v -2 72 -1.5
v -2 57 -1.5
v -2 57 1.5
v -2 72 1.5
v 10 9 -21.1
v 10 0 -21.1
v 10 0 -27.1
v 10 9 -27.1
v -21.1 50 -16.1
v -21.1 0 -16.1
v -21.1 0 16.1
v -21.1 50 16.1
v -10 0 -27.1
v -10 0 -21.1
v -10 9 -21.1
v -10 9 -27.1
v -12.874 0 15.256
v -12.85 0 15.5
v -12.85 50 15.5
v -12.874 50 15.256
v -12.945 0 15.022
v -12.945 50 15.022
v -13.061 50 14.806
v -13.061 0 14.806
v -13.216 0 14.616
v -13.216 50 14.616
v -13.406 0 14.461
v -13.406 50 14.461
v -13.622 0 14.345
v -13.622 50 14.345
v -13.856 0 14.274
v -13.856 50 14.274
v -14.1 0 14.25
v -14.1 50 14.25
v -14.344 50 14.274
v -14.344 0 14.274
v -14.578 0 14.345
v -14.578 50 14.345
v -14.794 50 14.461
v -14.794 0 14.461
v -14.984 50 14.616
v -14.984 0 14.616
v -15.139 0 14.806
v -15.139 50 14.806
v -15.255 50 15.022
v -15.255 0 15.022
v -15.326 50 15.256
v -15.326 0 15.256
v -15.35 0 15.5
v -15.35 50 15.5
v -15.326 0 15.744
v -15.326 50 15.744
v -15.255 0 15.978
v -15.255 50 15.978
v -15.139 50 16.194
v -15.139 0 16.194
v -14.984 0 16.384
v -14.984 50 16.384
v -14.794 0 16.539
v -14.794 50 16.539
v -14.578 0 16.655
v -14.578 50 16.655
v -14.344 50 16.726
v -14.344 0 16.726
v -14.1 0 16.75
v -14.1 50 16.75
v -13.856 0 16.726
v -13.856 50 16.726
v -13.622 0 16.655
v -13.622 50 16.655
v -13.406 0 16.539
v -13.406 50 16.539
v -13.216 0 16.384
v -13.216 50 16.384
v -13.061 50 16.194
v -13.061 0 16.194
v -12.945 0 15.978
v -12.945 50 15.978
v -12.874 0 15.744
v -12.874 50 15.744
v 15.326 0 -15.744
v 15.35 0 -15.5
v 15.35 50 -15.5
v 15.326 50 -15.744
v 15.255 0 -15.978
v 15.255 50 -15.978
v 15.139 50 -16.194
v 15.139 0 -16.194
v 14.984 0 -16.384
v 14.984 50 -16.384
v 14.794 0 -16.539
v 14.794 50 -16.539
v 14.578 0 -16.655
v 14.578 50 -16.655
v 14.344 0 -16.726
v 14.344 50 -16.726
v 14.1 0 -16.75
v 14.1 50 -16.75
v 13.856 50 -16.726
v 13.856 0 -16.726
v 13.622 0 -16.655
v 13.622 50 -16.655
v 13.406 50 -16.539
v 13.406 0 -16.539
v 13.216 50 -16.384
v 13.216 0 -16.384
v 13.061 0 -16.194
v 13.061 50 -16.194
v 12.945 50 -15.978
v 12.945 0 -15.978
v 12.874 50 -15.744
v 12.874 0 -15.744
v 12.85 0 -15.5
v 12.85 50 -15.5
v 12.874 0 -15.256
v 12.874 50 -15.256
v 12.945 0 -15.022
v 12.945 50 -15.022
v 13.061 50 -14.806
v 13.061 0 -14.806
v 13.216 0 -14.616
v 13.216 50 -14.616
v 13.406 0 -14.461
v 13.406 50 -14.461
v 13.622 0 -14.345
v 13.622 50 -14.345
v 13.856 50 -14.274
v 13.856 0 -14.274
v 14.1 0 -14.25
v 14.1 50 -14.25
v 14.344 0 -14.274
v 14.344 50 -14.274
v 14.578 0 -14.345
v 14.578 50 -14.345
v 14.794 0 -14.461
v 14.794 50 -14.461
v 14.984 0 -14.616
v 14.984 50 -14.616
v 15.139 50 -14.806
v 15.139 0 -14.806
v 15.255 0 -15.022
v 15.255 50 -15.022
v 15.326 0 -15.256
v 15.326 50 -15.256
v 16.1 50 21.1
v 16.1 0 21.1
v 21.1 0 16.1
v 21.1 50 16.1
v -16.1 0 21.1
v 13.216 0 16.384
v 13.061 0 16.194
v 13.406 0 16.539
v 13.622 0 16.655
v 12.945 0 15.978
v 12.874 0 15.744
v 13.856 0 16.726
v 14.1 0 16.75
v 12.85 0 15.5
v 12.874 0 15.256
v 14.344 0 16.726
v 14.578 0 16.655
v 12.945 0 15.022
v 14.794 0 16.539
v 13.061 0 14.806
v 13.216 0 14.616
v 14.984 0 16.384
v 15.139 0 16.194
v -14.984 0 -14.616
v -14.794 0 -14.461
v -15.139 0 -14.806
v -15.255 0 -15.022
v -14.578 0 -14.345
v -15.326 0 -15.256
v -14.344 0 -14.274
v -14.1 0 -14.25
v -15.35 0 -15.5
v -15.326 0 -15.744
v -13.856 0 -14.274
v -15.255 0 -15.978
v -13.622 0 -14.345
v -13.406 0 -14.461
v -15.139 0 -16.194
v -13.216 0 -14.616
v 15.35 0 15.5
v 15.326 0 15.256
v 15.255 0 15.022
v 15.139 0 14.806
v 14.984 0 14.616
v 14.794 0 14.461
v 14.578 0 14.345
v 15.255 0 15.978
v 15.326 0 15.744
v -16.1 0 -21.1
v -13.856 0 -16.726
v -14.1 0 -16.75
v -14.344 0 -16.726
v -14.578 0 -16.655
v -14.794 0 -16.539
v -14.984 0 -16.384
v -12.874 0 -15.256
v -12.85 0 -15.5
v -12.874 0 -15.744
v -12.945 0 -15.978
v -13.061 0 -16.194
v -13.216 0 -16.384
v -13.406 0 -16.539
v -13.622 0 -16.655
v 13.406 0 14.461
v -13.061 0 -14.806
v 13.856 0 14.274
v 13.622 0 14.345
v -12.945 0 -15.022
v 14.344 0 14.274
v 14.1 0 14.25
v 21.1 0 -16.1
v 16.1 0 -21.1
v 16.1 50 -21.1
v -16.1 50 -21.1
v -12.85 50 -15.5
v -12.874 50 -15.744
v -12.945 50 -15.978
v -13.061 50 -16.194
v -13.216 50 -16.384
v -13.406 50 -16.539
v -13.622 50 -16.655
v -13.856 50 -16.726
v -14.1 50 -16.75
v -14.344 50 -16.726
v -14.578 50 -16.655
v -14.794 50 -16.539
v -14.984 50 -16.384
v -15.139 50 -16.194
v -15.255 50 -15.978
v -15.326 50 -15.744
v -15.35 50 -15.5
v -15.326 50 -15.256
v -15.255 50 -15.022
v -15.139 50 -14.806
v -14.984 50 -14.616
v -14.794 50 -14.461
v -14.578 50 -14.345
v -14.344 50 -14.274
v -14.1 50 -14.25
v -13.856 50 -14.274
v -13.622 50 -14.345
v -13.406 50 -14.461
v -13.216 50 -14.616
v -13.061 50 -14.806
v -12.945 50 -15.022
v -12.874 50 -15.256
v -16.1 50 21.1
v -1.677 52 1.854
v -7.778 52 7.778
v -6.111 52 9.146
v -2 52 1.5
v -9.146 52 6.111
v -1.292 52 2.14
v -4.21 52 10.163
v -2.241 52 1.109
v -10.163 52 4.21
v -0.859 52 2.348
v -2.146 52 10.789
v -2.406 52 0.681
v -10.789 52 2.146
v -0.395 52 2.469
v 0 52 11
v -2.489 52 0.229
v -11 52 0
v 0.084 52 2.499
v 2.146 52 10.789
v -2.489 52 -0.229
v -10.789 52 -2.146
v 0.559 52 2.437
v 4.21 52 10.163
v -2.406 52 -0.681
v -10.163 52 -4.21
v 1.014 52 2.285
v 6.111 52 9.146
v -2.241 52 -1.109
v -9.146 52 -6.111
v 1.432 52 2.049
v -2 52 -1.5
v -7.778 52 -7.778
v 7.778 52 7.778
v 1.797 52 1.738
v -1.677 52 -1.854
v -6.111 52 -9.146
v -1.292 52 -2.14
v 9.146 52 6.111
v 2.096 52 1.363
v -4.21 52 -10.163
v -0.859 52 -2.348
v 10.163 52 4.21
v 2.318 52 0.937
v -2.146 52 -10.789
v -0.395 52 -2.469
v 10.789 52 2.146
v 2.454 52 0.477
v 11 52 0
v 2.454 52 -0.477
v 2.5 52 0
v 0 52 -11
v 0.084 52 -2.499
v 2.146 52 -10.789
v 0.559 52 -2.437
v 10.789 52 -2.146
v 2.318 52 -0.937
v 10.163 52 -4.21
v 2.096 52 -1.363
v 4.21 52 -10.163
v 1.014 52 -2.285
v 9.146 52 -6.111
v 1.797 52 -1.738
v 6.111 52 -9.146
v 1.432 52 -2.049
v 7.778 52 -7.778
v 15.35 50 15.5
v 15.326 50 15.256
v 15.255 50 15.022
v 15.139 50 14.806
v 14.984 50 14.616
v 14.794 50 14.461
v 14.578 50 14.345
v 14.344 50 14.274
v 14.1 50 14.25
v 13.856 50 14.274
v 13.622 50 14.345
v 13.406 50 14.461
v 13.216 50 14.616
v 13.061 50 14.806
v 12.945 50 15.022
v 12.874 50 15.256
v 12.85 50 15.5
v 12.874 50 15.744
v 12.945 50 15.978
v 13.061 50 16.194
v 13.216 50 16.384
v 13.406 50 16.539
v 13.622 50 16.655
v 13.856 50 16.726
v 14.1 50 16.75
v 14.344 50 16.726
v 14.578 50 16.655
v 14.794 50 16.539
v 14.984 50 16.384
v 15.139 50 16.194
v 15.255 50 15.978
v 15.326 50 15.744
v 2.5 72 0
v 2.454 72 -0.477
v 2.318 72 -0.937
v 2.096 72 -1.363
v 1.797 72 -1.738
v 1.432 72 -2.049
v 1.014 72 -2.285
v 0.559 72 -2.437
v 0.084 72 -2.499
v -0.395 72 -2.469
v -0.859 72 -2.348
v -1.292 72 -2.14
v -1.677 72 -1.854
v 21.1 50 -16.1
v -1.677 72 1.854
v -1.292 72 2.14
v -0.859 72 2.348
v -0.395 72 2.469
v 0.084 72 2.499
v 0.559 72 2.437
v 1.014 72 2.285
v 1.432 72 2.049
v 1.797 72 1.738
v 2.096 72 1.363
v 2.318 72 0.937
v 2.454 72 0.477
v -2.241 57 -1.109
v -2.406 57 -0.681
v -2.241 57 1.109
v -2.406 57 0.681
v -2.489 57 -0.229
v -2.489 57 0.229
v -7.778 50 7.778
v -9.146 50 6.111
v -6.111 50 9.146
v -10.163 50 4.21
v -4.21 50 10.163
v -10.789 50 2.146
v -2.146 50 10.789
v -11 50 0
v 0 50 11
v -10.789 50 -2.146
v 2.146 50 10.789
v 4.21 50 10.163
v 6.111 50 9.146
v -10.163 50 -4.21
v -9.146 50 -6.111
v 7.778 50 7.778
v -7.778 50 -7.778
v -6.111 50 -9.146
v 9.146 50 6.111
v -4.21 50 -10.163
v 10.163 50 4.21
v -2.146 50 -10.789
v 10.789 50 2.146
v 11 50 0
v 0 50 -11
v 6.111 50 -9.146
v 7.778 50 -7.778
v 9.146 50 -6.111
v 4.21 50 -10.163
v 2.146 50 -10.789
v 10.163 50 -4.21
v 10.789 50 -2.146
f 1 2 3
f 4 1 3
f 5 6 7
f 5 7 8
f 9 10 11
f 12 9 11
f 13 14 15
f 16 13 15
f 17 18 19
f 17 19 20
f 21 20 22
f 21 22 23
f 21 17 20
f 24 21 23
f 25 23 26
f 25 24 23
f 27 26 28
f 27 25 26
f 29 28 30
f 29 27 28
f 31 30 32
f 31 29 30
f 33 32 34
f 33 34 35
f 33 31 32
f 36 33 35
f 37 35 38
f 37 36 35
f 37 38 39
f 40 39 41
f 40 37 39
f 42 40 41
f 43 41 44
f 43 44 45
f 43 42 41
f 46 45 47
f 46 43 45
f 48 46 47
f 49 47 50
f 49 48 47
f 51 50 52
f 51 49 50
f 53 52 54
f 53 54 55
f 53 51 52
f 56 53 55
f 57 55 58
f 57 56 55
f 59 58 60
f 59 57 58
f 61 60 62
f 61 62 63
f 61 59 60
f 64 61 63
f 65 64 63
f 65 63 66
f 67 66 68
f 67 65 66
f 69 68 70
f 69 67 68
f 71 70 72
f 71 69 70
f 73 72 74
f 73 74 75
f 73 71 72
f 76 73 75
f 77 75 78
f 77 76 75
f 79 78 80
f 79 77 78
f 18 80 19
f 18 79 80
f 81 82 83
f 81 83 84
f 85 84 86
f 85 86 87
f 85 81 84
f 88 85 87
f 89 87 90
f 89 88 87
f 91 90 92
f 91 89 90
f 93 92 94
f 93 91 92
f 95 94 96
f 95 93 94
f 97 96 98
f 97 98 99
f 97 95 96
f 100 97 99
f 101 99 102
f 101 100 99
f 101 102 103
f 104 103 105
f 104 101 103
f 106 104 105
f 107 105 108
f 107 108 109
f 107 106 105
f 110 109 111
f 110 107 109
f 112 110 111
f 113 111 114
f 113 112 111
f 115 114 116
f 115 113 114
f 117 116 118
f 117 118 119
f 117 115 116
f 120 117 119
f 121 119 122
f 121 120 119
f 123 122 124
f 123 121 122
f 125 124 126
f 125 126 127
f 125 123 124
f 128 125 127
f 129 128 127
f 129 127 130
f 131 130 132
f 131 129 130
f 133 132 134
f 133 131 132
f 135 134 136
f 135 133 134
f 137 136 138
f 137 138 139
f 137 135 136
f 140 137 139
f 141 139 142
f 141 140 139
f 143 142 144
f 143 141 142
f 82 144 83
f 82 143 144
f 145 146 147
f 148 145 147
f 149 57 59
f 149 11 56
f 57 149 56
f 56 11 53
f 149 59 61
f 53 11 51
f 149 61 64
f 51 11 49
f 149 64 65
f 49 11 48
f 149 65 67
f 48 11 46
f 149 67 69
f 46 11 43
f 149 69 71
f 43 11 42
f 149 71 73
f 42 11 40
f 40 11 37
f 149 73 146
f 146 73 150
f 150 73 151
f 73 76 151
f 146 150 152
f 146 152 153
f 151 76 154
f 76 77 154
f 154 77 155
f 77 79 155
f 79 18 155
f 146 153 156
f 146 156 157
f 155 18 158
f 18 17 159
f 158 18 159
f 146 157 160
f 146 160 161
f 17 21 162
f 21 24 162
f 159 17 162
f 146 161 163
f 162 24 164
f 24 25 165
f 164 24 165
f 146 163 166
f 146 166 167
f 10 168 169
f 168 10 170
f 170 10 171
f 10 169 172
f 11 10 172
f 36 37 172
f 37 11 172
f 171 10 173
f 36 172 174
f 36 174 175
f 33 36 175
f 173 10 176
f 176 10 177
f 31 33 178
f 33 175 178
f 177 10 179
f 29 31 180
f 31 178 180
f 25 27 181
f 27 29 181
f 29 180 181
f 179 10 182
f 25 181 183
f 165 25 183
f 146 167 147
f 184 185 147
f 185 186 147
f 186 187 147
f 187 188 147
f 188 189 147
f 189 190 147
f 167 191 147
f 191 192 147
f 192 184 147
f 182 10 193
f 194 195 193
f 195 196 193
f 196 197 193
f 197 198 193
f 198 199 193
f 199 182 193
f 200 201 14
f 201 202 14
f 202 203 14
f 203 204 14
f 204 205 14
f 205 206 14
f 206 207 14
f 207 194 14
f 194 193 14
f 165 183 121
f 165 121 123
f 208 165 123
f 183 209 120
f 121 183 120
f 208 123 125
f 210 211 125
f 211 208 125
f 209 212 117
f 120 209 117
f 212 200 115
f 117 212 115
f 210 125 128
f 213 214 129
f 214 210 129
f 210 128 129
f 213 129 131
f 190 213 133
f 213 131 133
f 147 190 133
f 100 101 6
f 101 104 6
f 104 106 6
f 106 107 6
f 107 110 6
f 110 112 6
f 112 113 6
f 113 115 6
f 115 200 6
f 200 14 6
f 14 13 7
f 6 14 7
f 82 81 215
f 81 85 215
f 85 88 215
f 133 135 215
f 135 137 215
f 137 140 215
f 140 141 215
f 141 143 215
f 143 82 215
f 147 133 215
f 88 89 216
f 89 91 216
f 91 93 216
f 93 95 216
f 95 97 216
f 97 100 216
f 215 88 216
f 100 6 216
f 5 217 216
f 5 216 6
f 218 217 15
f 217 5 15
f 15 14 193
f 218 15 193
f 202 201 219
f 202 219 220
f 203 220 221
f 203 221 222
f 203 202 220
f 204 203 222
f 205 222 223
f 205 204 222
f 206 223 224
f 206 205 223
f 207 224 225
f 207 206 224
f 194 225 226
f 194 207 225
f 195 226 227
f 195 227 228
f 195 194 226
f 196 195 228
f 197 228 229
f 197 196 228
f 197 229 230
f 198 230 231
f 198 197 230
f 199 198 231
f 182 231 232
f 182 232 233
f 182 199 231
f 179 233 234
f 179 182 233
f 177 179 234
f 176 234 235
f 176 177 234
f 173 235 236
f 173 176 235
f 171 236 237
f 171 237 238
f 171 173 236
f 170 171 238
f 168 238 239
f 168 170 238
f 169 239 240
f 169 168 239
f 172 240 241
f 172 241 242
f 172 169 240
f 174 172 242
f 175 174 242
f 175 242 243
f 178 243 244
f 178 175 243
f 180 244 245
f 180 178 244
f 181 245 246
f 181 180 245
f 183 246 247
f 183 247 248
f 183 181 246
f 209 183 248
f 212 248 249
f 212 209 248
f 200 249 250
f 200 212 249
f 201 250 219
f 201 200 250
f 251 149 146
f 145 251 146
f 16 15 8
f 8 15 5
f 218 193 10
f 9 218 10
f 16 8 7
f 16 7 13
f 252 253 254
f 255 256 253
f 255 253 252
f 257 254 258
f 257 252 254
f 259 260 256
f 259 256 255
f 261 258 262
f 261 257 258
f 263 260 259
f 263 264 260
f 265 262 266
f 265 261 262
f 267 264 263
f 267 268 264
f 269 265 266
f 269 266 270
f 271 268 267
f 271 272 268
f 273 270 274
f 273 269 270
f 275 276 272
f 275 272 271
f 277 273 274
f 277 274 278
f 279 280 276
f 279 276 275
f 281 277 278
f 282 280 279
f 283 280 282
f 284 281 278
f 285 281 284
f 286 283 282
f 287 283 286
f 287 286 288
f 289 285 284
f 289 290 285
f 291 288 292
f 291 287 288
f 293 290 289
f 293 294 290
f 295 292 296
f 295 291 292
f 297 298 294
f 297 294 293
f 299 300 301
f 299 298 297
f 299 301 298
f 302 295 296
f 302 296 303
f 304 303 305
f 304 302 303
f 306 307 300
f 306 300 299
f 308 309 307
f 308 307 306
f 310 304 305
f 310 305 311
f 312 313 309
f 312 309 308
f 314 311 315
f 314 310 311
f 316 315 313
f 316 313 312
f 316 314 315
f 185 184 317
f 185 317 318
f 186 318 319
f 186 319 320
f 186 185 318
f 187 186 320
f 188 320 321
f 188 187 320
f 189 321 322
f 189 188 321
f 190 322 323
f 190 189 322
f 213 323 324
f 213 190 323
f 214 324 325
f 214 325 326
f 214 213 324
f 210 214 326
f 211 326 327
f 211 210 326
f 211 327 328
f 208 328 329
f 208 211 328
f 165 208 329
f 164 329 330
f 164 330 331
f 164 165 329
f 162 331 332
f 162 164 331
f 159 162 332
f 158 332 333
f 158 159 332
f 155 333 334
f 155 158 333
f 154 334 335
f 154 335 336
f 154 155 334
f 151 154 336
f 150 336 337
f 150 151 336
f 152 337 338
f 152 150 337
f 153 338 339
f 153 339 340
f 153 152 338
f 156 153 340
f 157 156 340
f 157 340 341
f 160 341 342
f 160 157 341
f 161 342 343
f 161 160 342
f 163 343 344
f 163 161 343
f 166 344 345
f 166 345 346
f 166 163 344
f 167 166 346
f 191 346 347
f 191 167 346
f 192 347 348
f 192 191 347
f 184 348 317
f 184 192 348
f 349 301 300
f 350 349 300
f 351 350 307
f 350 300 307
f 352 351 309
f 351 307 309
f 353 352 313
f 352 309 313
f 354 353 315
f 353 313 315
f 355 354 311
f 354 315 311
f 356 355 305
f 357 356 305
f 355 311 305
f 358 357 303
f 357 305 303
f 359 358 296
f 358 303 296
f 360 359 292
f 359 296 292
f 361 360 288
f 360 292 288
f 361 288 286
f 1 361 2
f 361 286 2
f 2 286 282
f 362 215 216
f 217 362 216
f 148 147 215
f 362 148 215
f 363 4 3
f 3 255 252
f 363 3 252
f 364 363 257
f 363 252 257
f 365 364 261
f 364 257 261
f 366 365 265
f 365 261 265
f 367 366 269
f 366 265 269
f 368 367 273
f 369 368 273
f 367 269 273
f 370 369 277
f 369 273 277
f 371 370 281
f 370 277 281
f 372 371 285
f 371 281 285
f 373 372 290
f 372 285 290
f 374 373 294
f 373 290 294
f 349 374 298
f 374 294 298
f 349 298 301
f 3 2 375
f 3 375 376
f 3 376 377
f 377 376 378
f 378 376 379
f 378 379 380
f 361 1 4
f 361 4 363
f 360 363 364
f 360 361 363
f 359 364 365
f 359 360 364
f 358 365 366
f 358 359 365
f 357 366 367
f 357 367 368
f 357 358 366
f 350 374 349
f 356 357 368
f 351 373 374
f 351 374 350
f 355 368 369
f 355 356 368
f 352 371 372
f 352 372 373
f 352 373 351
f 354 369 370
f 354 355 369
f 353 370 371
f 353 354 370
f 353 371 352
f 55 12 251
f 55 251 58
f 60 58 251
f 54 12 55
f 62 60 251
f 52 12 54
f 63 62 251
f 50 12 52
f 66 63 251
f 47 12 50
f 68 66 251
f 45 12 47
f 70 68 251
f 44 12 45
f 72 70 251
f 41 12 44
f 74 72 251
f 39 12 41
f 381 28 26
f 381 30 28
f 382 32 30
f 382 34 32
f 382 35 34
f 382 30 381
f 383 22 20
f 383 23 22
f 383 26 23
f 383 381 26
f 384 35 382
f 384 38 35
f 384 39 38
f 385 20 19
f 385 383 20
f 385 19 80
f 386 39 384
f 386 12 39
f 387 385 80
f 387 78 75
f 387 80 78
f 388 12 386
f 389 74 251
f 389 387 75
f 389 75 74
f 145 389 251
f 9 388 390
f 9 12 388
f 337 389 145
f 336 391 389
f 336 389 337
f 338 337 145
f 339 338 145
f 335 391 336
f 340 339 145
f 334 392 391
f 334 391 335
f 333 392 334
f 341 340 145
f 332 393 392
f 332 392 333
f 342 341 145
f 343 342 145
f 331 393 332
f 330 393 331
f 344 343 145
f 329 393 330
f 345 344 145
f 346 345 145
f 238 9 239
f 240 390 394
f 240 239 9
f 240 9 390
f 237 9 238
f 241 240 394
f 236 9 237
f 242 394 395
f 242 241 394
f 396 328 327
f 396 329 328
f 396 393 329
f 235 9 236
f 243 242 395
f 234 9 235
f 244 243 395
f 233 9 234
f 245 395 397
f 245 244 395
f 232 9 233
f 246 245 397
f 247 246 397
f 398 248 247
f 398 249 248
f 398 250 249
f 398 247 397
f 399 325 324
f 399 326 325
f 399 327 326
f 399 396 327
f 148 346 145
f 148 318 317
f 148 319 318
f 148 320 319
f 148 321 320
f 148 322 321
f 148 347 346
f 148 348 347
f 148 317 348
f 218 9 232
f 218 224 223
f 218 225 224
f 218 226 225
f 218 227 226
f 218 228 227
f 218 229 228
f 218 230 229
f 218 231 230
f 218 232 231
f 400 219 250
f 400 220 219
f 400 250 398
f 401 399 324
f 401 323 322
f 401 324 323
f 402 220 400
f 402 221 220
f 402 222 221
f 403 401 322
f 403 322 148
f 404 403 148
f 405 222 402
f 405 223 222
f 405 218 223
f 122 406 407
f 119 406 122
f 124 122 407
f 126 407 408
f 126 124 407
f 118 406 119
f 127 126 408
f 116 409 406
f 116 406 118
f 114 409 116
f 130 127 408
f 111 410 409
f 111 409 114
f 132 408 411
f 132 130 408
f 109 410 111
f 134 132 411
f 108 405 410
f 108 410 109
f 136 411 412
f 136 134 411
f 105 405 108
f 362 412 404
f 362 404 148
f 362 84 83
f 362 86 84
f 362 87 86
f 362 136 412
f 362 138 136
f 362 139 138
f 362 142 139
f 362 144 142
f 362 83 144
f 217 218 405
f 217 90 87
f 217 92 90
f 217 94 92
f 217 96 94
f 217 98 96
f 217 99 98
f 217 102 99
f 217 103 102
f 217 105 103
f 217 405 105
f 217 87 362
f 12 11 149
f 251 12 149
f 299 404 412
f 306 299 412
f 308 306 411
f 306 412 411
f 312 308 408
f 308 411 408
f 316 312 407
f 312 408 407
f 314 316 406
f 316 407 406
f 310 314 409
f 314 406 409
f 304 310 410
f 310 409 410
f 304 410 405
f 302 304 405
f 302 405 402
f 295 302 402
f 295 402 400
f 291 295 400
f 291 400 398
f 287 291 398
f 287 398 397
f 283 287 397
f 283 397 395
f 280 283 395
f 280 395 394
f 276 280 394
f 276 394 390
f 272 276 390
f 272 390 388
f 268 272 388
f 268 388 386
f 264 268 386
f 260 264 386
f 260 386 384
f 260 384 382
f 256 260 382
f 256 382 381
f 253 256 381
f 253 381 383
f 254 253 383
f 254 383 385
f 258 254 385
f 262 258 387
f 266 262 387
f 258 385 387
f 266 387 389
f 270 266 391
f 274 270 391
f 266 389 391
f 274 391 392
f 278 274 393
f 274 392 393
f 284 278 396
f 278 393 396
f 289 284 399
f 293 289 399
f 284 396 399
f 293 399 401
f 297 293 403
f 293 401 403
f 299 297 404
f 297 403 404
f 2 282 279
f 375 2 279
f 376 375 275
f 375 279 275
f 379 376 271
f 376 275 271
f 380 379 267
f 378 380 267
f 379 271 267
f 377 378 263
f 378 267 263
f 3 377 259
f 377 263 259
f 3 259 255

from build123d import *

# Parameters (mm, degrees)
SKETCH_1_R      = 1.25
SKETCH_1_R_2    = 11
EXTRUDE_1_DEPTH = 50
SKETCH_1_3_R    = 11
EXTRUDE_2_DEPTH = 52
EXTRUDE_3_DEPTH = 72
EXTRUDE_4_DEPTH = 57
SKETCH_2_W      = 20
SKETCH_2_H      = 9
EXTRUDE_5_DEPTH = 6


with BuildPart() as part:
    # 草图1 → 凸台-拉伸1 (new body)
    with BuildSketch(Plane(origin=(0, 0, 0), x_dir=(1, 0, 0), z_dir=(0, 1, 0))):
        Polygon((-21.1, -16.1), (-16.1, -21.1), (16.1, -21.1), (21.1, -16.1), (21.1, 16.1), (16.1, 21.1), (-16.1, 21.1), (-21.1, 16.1), align=None)
        with Locations((-14.1, -15.5)):
            Circle(SKETCH_1_R, mode=Mode.SUBTRACT)
        with Locations((14.1, -15.5)):
            Circle(SKETCH_1_R, mode=Mode.SUBTRACT)
        with Locations((-14.1, 15.5)):
            Circle(SKETCH_1_R, mode=Mode.SUBTRACT)
        Circle(SKETCH_1_R_2, mode=Mode.SUBTRACT)
        with Locations((14.1, 15.5)):
            Circle(SKETCH_1_R, mode=Mode.SUBTRACT)
    extrude(amount=EXTRUDE_1_DEPTH)

    # 草图1<3> → 凸台-拉伸2 (add)
    with BuildSketch(Plane(origin=(0, 0, 0), x_dir=(1, 0, 0), z_dir=(0, 1, 0))):
        Circle(SKETCH_1_3_R)
        with BuildLine():
            ThreePointArc((-2, -1.5), (-2.5, 0), (-2, 1.5))
            ThreePointArc((-2, 1.5), (0.790569415, 2.371708245), (2.5, 0))
            ThreePointArc((2.5, 0), (0.790569415, -2.371708245), (-2, -1.5))
        make_face(mode=Mode.SUBTRACT)
    extrude(amount=EXTRUDE_2_DEPTH)

    # 草图1<4> → 凸台-拉伸3 (add)
    with BuildSketch(Plane(origin=(0, 0, 0), x_dir=(1, 0, 0), z_dir=(0, 1, 0))):
        with BuildLine():
            ThreePointArc((2.5, 0), (0.790569415, 2.371708245), (-2, 1.5))
            Line((-2, 1.5), (-2, -1.5))
            ThreePointArc((-2, -1.5), (0.790569415, -2.371708245), (2.5, 0))
        make_face()
    extrude(amount=EXTRUDE_3_DEPTH)

    # 草图1<5> → 凸台-拉伸4 (add)
    with BuildSketch(Plane(origin=(0, 0, 0), x_dir=(1, 0, 0), z_dir=(0, 1, 0))):
        with BuildLine():
            Line((-2, -1.5), (-2, 1.5))
            ThreePointArc((-2, 1.5), (-2.5, 0), (-2, -1.5))
        make_face()
    extrude(amount=EXTRUDE_4_DEPTH)

    # 草图2 → 凸台-拉伸5 (add)
    with BuildSketch(Plane(origin=(0, 0, -21.1), x_dir=(-1, 0, 0), z_dir=(0, 0, -1))):
        with Locations((0, 4.5)):
            Rectangle(SKETCH_2_W, SKETCH_2_H)
    extrude(amount=EXTRUDE_5_DEPTH)


solid = part.part
